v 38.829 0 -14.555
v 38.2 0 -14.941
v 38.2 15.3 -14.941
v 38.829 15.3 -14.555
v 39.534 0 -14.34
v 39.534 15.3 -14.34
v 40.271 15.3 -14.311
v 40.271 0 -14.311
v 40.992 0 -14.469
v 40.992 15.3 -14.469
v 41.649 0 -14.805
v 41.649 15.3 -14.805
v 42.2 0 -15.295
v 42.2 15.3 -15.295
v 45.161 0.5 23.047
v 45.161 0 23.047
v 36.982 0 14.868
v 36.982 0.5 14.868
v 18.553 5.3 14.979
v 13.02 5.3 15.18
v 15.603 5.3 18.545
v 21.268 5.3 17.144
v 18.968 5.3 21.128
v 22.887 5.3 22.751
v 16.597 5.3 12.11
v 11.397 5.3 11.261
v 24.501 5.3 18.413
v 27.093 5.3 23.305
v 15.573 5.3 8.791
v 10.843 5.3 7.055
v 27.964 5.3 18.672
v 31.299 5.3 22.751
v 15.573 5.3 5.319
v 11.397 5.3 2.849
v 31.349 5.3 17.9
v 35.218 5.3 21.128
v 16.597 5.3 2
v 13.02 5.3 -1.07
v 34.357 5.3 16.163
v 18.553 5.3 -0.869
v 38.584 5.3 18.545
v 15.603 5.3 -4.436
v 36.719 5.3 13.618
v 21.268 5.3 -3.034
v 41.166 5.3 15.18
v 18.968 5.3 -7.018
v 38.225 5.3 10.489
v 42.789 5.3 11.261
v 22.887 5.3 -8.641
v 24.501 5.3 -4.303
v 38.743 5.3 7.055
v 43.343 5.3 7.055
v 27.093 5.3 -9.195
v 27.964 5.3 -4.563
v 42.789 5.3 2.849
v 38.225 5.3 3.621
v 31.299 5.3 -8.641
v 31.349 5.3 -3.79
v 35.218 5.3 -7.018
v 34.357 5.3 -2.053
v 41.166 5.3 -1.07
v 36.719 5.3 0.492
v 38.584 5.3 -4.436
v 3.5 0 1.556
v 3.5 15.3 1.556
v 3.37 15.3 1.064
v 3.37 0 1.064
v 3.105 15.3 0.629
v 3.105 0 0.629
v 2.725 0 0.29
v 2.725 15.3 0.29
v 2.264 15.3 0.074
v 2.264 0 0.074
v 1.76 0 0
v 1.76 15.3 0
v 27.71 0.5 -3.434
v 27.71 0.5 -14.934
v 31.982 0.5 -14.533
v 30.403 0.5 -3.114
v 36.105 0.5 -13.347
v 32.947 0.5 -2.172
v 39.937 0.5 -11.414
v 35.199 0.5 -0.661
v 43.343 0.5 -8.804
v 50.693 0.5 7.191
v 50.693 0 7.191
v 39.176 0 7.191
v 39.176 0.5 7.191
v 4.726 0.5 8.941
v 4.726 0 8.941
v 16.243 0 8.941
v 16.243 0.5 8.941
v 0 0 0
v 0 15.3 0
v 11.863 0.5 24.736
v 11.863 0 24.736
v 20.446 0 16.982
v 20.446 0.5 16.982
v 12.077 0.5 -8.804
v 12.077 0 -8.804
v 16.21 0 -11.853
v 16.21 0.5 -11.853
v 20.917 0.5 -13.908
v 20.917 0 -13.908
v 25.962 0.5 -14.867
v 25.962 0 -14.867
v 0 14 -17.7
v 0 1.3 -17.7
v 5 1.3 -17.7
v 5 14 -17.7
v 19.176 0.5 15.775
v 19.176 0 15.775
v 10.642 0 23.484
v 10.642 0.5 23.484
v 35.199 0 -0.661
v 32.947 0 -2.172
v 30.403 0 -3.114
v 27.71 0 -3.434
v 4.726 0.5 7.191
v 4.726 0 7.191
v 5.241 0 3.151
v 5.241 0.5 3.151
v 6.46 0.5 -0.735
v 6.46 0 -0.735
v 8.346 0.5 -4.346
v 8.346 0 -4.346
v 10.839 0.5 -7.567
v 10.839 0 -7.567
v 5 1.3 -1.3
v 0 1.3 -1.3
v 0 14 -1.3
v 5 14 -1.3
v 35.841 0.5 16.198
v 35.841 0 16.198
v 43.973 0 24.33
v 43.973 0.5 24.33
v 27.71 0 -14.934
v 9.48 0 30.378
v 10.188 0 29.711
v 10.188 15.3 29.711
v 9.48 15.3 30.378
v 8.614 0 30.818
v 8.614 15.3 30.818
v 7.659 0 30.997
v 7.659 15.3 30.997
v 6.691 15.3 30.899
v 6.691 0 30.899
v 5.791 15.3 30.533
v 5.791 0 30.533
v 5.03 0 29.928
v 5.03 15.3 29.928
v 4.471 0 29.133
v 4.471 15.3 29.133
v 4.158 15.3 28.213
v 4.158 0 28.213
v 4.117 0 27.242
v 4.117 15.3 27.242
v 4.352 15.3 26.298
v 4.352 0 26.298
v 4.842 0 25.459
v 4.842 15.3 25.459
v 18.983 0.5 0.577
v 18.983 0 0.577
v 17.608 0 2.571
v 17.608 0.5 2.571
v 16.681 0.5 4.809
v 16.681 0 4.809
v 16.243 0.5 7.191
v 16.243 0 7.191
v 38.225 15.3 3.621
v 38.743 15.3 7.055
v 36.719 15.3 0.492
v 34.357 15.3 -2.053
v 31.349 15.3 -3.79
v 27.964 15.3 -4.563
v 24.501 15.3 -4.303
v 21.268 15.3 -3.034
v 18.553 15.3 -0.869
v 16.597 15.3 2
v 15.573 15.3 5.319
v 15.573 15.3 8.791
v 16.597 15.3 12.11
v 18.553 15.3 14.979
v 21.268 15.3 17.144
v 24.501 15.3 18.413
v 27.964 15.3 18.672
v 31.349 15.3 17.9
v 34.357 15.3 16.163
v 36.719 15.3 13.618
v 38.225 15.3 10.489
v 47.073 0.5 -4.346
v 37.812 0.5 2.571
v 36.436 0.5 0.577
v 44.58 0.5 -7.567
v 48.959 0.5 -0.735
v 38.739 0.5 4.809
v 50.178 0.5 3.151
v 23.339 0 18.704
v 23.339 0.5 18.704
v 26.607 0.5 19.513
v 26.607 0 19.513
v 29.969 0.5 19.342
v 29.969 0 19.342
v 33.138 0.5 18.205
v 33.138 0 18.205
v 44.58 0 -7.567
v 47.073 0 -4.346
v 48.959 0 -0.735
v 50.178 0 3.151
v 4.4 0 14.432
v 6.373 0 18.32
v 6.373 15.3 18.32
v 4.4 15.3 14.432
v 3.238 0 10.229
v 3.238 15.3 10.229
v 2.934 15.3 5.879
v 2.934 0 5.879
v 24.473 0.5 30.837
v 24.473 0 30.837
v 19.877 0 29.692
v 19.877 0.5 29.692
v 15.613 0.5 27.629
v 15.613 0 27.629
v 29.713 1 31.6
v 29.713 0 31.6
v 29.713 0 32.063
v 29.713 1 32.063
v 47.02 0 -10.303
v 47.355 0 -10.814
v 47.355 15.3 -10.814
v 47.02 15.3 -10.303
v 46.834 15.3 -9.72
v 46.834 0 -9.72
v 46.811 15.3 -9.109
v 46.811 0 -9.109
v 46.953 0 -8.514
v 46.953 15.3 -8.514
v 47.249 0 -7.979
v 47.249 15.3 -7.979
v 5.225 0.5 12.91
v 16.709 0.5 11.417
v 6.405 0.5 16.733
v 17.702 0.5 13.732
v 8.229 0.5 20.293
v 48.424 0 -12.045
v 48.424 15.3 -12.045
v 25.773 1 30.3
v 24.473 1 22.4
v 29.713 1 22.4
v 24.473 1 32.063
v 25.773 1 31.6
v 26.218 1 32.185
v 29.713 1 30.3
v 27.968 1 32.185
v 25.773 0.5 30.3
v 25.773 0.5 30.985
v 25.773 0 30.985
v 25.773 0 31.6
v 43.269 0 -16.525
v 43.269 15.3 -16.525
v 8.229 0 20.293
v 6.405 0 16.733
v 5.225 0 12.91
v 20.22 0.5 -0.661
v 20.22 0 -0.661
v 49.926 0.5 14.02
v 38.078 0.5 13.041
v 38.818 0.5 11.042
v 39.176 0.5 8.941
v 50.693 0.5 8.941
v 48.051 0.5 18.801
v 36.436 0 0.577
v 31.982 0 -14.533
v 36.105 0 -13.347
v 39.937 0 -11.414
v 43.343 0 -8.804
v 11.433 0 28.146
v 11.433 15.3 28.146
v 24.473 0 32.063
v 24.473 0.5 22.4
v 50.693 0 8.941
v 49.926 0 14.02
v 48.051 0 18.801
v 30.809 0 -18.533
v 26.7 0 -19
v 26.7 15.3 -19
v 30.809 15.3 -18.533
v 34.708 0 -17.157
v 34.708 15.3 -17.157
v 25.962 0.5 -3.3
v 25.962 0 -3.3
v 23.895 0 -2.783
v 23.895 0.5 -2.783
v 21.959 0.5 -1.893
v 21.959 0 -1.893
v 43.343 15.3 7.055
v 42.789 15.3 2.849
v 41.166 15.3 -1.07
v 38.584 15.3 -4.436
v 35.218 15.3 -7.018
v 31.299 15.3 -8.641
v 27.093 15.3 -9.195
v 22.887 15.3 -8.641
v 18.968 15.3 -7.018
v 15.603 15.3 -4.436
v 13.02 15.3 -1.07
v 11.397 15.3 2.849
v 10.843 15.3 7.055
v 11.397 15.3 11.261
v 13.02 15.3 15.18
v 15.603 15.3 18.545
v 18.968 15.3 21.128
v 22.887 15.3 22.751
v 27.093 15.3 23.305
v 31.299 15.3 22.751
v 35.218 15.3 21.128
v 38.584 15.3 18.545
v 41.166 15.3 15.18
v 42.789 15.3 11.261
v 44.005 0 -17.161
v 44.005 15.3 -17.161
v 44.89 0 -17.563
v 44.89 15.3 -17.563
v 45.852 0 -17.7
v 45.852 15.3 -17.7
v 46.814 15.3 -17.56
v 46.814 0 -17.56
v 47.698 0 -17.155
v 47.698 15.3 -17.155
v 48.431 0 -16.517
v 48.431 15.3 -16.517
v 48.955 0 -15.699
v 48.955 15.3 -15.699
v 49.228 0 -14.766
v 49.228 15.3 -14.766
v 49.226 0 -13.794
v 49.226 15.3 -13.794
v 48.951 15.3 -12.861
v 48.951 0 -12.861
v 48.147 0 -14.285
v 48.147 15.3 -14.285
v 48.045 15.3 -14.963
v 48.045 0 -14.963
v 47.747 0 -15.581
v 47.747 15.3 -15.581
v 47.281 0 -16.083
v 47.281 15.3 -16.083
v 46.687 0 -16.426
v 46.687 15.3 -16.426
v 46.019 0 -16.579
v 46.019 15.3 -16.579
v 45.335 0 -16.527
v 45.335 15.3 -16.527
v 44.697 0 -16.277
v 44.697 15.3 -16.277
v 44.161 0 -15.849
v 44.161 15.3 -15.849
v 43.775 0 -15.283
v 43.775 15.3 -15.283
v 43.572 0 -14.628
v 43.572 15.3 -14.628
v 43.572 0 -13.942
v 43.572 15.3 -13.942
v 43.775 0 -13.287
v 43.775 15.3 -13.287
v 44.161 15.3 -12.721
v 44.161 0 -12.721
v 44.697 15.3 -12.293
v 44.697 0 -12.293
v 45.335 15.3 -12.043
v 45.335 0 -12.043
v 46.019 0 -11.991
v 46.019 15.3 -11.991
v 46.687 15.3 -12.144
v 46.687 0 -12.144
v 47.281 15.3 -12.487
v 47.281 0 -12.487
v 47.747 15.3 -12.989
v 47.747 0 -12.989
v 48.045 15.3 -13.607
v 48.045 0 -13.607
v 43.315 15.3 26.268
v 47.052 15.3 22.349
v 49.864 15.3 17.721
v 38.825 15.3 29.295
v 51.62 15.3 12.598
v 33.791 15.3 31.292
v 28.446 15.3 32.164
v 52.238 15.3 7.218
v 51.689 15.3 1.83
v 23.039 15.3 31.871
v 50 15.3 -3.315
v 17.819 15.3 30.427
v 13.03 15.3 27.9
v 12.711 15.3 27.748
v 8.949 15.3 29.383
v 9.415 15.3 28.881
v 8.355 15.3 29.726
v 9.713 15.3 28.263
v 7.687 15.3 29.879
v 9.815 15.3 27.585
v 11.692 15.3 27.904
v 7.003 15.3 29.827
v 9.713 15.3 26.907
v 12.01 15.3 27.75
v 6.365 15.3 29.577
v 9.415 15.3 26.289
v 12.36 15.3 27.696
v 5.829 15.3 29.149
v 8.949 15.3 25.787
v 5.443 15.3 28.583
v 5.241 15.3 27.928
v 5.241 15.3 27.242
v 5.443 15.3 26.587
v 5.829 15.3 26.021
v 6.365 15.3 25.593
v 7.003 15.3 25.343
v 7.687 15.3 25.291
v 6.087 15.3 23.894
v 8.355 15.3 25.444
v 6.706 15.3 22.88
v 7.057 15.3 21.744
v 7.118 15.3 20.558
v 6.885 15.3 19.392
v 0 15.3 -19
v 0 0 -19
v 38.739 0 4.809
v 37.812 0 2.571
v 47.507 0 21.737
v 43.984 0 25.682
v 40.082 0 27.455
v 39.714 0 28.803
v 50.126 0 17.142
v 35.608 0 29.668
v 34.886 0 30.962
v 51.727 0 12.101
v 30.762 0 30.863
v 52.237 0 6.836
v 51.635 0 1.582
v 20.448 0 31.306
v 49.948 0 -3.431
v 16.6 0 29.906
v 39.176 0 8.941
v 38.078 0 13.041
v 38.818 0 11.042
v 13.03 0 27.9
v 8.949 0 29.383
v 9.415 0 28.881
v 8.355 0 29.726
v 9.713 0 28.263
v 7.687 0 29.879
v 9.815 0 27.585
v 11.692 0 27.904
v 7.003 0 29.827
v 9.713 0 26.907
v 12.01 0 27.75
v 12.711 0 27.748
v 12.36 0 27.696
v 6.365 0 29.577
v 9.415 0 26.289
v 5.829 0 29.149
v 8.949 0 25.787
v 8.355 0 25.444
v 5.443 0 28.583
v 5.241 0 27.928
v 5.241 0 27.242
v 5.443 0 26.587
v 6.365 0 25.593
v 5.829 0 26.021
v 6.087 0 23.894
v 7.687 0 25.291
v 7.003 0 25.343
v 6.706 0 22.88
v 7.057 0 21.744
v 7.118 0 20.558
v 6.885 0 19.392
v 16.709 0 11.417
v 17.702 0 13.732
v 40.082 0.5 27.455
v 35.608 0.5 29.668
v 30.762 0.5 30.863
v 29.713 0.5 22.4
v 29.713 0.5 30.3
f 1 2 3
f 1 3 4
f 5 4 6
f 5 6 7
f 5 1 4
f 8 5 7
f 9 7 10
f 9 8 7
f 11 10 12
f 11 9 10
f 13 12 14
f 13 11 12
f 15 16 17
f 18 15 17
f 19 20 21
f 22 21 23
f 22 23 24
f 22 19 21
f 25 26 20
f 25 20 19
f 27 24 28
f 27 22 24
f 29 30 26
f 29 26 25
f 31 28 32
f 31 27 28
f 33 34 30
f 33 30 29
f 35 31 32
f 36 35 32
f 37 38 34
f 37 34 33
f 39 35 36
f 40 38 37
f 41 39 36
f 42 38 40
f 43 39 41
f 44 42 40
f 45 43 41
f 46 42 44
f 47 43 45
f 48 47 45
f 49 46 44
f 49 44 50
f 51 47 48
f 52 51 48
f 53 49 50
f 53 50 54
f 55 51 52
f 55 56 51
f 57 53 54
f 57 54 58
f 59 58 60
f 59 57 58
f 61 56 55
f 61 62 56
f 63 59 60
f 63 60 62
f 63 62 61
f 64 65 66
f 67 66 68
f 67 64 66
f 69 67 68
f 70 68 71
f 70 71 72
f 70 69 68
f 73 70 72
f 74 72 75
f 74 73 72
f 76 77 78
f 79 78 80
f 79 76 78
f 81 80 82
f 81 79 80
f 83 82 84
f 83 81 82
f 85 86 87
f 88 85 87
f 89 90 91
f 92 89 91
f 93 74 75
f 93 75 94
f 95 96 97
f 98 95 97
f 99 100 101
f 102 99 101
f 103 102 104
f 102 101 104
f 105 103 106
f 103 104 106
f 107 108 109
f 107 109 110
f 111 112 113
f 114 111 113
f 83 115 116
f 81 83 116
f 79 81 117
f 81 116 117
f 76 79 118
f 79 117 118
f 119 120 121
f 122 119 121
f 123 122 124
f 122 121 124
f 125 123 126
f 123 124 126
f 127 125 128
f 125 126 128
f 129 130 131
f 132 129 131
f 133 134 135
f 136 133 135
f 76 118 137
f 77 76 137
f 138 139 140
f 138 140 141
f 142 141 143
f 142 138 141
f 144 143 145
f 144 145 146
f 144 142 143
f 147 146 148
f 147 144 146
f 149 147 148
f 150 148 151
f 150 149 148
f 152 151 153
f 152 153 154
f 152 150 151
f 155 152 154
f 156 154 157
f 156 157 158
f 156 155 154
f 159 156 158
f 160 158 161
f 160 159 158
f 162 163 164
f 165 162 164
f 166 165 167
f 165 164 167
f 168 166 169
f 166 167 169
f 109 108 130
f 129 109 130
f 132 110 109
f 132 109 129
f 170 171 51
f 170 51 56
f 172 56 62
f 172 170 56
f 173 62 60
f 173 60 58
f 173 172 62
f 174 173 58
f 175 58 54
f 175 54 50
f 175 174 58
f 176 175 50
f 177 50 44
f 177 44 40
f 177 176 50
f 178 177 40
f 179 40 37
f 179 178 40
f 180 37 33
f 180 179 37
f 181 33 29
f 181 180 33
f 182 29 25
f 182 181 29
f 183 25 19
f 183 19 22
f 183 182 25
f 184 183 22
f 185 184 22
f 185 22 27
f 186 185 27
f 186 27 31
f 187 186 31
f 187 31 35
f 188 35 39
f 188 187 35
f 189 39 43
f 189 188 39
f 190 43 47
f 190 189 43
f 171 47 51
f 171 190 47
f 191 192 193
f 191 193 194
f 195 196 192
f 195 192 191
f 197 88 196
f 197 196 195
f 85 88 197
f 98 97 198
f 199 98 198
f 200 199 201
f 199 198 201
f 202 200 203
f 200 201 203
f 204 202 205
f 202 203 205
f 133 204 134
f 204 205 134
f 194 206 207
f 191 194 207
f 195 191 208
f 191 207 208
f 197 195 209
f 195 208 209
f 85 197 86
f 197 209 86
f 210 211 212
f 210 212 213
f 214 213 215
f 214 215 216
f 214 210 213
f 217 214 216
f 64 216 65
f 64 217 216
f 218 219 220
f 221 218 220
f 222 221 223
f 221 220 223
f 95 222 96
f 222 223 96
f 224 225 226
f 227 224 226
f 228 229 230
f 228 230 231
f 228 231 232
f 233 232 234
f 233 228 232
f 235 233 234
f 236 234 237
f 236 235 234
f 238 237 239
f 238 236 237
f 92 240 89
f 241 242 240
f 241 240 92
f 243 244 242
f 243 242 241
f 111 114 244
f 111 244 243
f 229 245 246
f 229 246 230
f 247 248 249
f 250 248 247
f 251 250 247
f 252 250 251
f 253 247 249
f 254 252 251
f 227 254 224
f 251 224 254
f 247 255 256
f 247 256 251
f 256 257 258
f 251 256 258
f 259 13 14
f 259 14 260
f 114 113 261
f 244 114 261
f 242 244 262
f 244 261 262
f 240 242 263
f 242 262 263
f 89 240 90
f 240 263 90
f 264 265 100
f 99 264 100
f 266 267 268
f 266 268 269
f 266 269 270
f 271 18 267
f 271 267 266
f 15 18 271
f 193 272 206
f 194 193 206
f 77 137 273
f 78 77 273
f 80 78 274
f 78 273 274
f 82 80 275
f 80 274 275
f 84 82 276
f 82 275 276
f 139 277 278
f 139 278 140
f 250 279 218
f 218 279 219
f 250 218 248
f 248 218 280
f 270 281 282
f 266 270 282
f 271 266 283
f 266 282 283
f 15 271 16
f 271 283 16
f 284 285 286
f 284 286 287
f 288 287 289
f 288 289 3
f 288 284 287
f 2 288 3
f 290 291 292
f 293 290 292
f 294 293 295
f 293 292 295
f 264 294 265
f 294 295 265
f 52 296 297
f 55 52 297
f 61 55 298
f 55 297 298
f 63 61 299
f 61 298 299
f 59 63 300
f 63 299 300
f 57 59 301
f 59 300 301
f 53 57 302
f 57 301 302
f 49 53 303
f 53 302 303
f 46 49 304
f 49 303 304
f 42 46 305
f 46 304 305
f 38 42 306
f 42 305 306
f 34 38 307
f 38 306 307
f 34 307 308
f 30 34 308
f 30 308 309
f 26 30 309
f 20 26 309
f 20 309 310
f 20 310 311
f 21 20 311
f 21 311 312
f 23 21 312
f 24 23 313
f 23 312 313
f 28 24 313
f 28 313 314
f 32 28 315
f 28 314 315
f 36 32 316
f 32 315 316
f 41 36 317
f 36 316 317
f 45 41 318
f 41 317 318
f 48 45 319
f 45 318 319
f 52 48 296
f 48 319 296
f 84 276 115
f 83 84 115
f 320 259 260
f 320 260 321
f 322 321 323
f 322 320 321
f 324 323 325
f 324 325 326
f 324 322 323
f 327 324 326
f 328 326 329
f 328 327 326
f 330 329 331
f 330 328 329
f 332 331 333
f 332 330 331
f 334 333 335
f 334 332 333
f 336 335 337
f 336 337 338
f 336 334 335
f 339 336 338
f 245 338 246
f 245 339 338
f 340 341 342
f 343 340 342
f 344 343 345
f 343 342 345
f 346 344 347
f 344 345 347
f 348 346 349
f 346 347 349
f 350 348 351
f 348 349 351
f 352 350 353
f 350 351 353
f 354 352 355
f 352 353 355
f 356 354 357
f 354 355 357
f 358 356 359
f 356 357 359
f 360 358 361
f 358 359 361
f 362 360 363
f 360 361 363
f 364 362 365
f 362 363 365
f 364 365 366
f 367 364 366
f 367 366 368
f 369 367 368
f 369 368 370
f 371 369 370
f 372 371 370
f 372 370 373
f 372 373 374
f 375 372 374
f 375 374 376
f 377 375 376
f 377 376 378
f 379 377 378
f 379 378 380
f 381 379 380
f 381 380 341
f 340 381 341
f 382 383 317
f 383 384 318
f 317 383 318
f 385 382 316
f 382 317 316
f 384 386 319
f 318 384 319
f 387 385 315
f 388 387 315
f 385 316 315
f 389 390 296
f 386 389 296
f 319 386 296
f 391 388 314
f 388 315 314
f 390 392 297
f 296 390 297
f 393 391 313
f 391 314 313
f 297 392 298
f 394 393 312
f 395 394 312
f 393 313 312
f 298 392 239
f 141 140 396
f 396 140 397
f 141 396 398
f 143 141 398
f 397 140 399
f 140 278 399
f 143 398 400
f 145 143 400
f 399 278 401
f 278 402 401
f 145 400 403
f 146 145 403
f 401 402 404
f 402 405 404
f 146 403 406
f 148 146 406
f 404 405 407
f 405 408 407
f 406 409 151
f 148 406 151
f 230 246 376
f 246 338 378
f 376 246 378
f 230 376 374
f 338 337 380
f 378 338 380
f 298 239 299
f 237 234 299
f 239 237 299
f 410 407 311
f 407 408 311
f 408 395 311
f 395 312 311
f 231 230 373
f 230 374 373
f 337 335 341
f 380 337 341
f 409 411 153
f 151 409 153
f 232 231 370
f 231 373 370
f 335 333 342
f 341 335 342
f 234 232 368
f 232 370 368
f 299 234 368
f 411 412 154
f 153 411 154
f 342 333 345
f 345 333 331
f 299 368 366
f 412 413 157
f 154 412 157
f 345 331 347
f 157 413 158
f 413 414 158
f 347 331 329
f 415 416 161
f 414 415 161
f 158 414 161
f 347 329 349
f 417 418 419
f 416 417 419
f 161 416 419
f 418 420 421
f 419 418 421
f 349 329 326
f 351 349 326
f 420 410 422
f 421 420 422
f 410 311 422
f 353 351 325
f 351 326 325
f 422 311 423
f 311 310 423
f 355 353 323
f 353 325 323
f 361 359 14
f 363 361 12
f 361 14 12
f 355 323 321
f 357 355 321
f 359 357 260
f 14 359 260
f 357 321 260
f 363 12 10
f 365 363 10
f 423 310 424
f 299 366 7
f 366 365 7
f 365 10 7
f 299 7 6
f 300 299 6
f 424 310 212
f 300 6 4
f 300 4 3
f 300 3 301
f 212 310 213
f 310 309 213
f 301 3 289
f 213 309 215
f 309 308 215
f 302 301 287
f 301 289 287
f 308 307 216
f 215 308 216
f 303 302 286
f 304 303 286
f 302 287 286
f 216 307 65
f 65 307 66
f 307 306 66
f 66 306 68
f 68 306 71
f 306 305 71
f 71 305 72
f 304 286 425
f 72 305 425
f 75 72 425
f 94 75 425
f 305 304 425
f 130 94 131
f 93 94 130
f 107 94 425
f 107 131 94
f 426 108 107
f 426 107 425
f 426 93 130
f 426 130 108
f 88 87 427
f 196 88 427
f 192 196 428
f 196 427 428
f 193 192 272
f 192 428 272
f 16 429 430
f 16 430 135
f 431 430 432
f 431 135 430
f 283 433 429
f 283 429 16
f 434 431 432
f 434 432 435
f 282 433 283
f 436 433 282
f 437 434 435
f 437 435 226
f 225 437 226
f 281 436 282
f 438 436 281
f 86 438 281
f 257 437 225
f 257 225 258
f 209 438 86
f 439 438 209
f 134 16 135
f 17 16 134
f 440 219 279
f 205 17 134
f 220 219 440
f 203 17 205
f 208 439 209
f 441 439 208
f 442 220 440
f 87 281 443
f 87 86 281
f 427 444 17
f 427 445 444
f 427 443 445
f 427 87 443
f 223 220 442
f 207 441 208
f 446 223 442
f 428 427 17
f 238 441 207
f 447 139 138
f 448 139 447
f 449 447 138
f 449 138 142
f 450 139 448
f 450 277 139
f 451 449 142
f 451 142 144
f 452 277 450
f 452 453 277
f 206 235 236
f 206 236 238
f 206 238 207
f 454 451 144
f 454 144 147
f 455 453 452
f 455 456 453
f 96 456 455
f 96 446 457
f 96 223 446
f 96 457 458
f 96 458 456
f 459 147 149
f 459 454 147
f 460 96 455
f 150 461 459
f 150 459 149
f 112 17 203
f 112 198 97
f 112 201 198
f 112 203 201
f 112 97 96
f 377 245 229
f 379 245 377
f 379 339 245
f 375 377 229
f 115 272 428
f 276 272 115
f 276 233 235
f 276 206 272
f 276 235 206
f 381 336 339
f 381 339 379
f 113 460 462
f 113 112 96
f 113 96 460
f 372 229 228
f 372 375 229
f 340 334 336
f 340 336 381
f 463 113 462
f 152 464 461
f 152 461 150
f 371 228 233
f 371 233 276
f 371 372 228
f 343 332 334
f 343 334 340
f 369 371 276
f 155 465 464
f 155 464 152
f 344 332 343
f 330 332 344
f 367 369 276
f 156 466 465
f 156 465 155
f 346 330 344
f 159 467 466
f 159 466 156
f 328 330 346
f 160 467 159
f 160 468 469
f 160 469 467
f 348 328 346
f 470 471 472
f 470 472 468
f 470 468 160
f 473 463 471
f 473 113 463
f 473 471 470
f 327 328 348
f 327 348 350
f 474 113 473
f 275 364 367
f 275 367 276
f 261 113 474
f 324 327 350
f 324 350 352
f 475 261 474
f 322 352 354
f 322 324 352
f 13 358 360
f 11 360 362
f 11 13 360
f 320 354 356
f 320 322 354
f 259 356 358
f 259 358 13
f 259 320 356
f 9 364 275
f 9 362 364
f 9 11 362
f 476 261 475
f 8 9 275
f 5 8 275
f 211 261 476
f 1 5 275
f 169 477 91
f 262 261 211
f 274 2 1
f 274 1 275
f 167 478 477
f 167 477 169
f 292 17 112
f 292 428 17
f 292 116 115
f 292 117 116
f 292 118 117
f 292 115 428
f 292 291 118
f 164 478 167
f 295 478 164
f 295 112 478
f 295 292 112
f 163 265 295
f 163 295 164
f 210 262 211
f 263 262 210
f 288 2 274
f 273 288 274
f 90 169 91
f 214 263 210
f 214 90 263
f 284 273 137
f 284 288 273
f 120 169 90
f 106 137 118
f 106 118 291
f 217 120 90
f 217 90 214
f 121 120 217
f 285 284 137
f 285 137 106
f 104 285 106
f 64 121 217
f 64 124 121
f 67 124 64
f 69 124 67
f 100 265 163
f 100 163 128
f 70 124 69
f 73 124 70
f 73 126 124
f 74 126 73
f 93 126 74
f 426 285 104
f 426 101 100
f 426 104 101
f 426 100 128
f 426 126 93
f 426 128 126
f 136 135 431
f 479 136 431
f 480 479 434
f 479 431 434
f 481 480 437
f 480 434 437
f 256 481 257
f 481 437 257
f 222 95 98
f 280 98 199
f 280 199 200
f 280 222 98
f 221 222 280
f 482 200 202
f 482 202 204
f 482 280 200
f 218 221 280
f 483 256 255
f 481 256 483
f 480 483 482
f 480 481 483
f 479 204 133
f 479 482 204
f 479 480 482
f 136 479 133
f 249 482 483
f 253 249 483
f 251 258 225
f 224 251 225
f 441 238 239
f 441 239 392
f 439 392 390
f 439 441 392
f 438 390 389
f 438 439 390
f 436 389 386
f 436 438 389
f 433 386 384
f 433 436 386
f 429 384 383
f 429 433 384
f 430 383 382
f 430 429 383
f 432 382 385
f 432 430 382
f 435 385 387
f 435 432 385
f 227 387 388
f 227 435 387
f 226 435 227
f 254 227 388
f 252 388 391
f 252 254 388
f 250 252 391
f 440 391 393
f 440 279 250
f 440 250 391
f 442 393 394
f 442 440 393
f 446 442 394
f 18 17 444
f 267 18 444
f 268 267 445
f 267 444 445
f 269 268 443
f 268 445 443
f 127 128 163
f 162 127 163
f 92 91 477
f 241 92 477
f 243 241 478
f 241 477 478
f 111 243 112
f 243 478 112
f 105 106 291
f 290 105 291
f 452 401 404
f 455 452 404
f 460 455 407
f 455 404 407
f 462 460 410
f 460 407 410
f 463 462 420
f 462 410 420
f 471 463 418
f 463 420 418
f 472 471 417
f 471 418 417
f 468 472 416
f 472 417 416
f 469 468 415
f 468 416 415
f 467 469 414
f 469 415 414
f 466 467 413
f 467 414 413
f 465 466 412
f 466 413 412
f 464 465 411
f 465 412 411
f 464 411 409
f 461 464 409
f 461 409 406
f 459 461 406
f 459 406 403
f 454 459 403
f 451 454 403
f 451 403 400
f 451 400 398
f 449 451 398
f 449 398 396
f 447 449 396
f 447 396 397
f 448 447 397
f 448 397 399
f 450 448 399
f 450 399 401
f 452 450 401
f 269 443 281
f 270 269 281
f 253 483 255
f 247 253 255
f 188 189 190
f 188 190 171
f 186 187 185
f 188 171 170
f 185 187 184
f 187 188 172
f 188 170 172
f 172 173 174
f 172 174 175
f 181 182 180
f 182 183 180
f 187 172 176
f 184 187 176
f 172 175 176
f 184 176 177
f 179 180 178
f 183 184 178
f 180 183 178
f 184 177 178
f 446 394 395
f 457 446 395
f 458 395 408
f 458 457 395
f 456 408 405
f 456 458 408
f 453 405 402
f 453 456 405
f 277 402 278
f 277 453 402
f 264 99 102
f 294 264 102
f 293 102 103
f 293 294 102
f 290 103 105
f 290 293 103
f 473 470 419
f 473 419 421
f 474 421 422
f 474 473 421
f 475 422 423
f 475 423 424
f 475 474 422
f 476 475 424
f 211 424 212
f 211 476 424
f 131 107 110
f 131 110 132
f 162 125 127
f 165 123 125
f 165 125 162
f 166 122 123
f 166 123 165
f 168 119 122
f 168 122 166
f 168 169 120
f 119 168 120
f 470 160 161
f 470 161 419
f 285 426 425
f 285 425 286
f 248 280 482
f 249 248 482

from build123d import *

# Parameters (mm, degrees)
BOSS_EXTRUDE1_DEPTH = 15.3
SKETCH2_R           = 2.3
CUT_EXTRUDE1_DEPTH  = 16.3
SKETCH3_R           = 16.25
SKETCH3_R_2         = 11.65
CUT_EXTRUDE2_DEPTH  = 10
SKETCH4_W           = 16.4
SKETCH4_H           = 12.7
CUT_EXTRUDE3_DEPTH  = 5
CUT_EXTRUDE6_DEPTH  = 1
CUT_EXTRUDE7_DEPTH  = 0.5


with BuildPart() as part:
    # Sketch1 → Boss-Extrude1 (new body)
    with BuildSketch(Plane(origin=(0, 0, 0), x_dir=(1, 0, 0), z_dir=(0, 1, 0))):
        with BuildLine():
            Line((0, 0), (0, 19))
            Line((0, 19), (26.7, 19))
            ThreePointArc((26.7, 19), (32.797644088, 17.95548785), (38.2, 14.941052635))
            ThreePointArc((38.2, 14.941052635), (40.271433107, 14.311273646), (42.2, 15.295187477))
            Line((42.2, 15.295187477), (43.269443579, 16.525441584))
            ThreePointArc((43.269443579, 16.525441584), (48.087218379, 16.862333216), (48.424110012, 12.044558416))
            Line((48.424110012, 12.044558416), (47.354666433, 10.814304309))
            ThreePointArc((47.354666433, 10.814304309), (46.801667822, 9.415462269), (47.248710238, 7.979245156))
            ThreePointArc((47.248710238, 7.979245156), (45.289416111, -24.409093359), (13.030186992, -27.899858595))
            ThreePointArc((13.030186992, -27.899858595), (12.183303759, -27.710109359), (11.432636129, -28.14567117))
            Line((11.432636129, -28.14567117), (10.187606856, -29.710887484))
            ThreePointArc((10.187606856, -29.710887484), (5.389112516, -30.257606856), (4.842393144, -25.459112516))
            Line((4.842393144, -25.459112516), (6.087422418, -23.893896202))
            ThreePointArc((6.087422418, -23.893896202), (7.124082388, -21.152735596), (6.372856996, -18.320018566))
            ThreePointArc((6.372856996, -18.320018566), (3.237759838, -10.229166003), (3.5, -1.556106595))
            ThreePointArc((3.5, -1.556106595), (2.927161914, -0.445774177), (1.76, 0))
            Line((1.76, 0), (0, 0))
        make_face()
    extrude(amount=BOSS_EXTRUDE1_DEPTH)

    # Sketch2 → Cut-Extrude1 (cut, through all)
    with BuildSketch(Plane(origin=(0, 15.3, 0), x_dir=(1, 0, 0), z_dir=(0, 1, 0))):
        with Locations((45.846776795, 14.285)):
            Circle(SKETCH2_R)
        with Locations((7.515, -27.585)):
            Circle(SKETCH2_R)
    extrude(amount=-CUT_EXTRUDE1_DEPTH, mode=Mode.SUBTRACT)

    # Sketch3 → Cut-Extrude2 (cut)
    with BuildSketch(Plane(origin=(0, 15.3, 0), x_dir=(1, 0, 0), z_dir=(0, 1, 0))):
        with Locations((27.093039229, -7.054893275)):
            Circle(SKETCH3_R)
        with Locations((27.093039229, -7.054893275)):
            Circle(SKETCH3_R_2, mode=Mode.SUBTRACT)
    extrude(amount=-CUT_EXTRUDE2_DEPTH, mode=Mode.SUBTRACT)

    # Sketch4 → Cut-Extrude3 (cut)
    with BuildSketch(Plane.ZY):
        with Locations((-9.5, 7.65)):
            Rectangle(SKETCH4_W, SKETCH4_H)
    extrude(amount=-CUT_EXTRUDE3_DEPTH, mode=Mode.SUBTRACT)

    # Sketch5 → Cut-Extrude6 (cut)
    with BuildSketch(Plane.XZ):
        Polygon((24.473039229, 32.3), (24.473039229, 22.4), (29.713039229, 22.4), (29.713039229, 30.3), (25.773039229, 30.3), (25.773039229, 31.6), (29.713039229, 31.6), (29.713039229, 32.3), align=None)
    extrude(amount=-CUT_EXTRUDE6_DEPTH, mode=Mode.SUBTRACT)

    # Sketch6 → Cut-Extrude7 (cut)
    with BuildSketch(Plane.XZ):
        with BuildLine():
            ThreePointArc((20.446034334, 16.982126203), (28.294472835, 19.55144458), (35.841272267, 16.198057911))
            Line((35.841272267, 16.198057911), (43.97300025, 24.329785894))
            ThreePointArc((43.97300025, 24.329785894), (35.608102686, 29.66755154), (25.773039229, 30.984662069))
            Line((25.773039229, 30.984662069), (25.773039229, 30.3))
            Line((25.773039229, 30.3), (29.713039229, 30.3))
            Line((29.713039229, 30.3), (29.713039229, 22.4))
            Line((29.713039229, 22.4), (24.473039229, 22.4))
            Line((24.473039229, 22.4), (24.473039229, 30.837474717))
            ThreePointArc((24.473039229, 30.837474717), (17.69194169, 28.770137265), (11.862557451, 24.735853266))
            Line((11.862557451, 24.735853266), (20.446034334, 16.982126203))
        make_face()
        with BuildLine():
            ThreePointArc((16.242880644, 8.941329927), (17.141710334, 12.601843748), (19.175813557, 15.775119708))
            Line((19.175813557, 15.775119708), (10.642082831, 23.48390949))
            ThreePointArc((10.642082831, 23.48390949), (6.404884497, 16.733017379), (4.726194331, 8.941329927))
            Line((4.726194331, 8.941329927), (16.242880644, 8.941329927))
        make_face()
        with BuildLine():
            ThreePointArc((18.982670233, 0.576892744), (17.084929659, 3.665470455), (16.242880644, 7.191329927))
            Line((16.242880644, 7.191329927), (4.726194331, 7.191329927))
            ThreePointArc((4.726194331, 7.191329927), (6.460315035, -0.735389017), (10.839143244, -7.566634245))
            Line((10.839143244, -7.566634245), (18.982670233, 0.576892744))
        make_face()
        with BuildLine():
            ThreePointArc((25.962402252, -3.30017766), (22.906366669, -2.382568809), (20.2201071, -0.660544123))
            Line((20.2201071, -0.660544123), (12.076580111, -8.804071112))
            ThreePointArc((12.076580111, -8.804071112), (18.505879136, -13.011918289), (25.962402252, -14.867215257))
            Line((25.962402252, -14.867215257), (25.962402252, -3.30017766))
        make_face()
        with BuildLine():
            Line((43.342508455, -8.804071112), (35.198981466, -0.660544123))
            ThreePointArc((35.198981466, -0.660544123), (31.702722743, -2.718127676), (27.709544283, -3.433670073))
            Line((27.709544283, -3.433670073), (27.709544283, -14.933670073))
            ThreePointArc((27.709544283, -14.933670073), (36.105399692, -13.346507623), (43.342508455, -8.804071112))
        make_face()
        with BuildLine():
            Line((50.692894235, 7.191329927), (39.176207922, 7.191329927))
            ThreePointArc((39.176207922, 7.191329927), (38.334158907, 3.665470455), (36.436418333, 0.576892744))
            Line((36.436418333, 0.576892744), (44.579945322, -7.566634245))
            ThreePointArc((44.579945322, -7.566634245), (48.958773531, -0.735389017), (50.692894235, 7.191329927))
        make_face()
        with BuildLine():
            Line((45.161425577, 23.047379266), (36.982294854, 14.868248542))
            ThreePointArc((36.982294854, 14.868248542), (38.494390898, 12.058457617), (39.176207922, 8.941329927))
            Line((39.176207922, 8.941329927), (50.692894235, 8.941329927))
            ThreePointArc((50.692894235, 8.941329927), (49.122090569, 16.462928139), (45.161425577, 23.047379266))
        make_face()
    extrude(amount=-CUT_EXTRUDE7_DEPTH, mode=Mode.SUBTRACT)


solid = part.part
